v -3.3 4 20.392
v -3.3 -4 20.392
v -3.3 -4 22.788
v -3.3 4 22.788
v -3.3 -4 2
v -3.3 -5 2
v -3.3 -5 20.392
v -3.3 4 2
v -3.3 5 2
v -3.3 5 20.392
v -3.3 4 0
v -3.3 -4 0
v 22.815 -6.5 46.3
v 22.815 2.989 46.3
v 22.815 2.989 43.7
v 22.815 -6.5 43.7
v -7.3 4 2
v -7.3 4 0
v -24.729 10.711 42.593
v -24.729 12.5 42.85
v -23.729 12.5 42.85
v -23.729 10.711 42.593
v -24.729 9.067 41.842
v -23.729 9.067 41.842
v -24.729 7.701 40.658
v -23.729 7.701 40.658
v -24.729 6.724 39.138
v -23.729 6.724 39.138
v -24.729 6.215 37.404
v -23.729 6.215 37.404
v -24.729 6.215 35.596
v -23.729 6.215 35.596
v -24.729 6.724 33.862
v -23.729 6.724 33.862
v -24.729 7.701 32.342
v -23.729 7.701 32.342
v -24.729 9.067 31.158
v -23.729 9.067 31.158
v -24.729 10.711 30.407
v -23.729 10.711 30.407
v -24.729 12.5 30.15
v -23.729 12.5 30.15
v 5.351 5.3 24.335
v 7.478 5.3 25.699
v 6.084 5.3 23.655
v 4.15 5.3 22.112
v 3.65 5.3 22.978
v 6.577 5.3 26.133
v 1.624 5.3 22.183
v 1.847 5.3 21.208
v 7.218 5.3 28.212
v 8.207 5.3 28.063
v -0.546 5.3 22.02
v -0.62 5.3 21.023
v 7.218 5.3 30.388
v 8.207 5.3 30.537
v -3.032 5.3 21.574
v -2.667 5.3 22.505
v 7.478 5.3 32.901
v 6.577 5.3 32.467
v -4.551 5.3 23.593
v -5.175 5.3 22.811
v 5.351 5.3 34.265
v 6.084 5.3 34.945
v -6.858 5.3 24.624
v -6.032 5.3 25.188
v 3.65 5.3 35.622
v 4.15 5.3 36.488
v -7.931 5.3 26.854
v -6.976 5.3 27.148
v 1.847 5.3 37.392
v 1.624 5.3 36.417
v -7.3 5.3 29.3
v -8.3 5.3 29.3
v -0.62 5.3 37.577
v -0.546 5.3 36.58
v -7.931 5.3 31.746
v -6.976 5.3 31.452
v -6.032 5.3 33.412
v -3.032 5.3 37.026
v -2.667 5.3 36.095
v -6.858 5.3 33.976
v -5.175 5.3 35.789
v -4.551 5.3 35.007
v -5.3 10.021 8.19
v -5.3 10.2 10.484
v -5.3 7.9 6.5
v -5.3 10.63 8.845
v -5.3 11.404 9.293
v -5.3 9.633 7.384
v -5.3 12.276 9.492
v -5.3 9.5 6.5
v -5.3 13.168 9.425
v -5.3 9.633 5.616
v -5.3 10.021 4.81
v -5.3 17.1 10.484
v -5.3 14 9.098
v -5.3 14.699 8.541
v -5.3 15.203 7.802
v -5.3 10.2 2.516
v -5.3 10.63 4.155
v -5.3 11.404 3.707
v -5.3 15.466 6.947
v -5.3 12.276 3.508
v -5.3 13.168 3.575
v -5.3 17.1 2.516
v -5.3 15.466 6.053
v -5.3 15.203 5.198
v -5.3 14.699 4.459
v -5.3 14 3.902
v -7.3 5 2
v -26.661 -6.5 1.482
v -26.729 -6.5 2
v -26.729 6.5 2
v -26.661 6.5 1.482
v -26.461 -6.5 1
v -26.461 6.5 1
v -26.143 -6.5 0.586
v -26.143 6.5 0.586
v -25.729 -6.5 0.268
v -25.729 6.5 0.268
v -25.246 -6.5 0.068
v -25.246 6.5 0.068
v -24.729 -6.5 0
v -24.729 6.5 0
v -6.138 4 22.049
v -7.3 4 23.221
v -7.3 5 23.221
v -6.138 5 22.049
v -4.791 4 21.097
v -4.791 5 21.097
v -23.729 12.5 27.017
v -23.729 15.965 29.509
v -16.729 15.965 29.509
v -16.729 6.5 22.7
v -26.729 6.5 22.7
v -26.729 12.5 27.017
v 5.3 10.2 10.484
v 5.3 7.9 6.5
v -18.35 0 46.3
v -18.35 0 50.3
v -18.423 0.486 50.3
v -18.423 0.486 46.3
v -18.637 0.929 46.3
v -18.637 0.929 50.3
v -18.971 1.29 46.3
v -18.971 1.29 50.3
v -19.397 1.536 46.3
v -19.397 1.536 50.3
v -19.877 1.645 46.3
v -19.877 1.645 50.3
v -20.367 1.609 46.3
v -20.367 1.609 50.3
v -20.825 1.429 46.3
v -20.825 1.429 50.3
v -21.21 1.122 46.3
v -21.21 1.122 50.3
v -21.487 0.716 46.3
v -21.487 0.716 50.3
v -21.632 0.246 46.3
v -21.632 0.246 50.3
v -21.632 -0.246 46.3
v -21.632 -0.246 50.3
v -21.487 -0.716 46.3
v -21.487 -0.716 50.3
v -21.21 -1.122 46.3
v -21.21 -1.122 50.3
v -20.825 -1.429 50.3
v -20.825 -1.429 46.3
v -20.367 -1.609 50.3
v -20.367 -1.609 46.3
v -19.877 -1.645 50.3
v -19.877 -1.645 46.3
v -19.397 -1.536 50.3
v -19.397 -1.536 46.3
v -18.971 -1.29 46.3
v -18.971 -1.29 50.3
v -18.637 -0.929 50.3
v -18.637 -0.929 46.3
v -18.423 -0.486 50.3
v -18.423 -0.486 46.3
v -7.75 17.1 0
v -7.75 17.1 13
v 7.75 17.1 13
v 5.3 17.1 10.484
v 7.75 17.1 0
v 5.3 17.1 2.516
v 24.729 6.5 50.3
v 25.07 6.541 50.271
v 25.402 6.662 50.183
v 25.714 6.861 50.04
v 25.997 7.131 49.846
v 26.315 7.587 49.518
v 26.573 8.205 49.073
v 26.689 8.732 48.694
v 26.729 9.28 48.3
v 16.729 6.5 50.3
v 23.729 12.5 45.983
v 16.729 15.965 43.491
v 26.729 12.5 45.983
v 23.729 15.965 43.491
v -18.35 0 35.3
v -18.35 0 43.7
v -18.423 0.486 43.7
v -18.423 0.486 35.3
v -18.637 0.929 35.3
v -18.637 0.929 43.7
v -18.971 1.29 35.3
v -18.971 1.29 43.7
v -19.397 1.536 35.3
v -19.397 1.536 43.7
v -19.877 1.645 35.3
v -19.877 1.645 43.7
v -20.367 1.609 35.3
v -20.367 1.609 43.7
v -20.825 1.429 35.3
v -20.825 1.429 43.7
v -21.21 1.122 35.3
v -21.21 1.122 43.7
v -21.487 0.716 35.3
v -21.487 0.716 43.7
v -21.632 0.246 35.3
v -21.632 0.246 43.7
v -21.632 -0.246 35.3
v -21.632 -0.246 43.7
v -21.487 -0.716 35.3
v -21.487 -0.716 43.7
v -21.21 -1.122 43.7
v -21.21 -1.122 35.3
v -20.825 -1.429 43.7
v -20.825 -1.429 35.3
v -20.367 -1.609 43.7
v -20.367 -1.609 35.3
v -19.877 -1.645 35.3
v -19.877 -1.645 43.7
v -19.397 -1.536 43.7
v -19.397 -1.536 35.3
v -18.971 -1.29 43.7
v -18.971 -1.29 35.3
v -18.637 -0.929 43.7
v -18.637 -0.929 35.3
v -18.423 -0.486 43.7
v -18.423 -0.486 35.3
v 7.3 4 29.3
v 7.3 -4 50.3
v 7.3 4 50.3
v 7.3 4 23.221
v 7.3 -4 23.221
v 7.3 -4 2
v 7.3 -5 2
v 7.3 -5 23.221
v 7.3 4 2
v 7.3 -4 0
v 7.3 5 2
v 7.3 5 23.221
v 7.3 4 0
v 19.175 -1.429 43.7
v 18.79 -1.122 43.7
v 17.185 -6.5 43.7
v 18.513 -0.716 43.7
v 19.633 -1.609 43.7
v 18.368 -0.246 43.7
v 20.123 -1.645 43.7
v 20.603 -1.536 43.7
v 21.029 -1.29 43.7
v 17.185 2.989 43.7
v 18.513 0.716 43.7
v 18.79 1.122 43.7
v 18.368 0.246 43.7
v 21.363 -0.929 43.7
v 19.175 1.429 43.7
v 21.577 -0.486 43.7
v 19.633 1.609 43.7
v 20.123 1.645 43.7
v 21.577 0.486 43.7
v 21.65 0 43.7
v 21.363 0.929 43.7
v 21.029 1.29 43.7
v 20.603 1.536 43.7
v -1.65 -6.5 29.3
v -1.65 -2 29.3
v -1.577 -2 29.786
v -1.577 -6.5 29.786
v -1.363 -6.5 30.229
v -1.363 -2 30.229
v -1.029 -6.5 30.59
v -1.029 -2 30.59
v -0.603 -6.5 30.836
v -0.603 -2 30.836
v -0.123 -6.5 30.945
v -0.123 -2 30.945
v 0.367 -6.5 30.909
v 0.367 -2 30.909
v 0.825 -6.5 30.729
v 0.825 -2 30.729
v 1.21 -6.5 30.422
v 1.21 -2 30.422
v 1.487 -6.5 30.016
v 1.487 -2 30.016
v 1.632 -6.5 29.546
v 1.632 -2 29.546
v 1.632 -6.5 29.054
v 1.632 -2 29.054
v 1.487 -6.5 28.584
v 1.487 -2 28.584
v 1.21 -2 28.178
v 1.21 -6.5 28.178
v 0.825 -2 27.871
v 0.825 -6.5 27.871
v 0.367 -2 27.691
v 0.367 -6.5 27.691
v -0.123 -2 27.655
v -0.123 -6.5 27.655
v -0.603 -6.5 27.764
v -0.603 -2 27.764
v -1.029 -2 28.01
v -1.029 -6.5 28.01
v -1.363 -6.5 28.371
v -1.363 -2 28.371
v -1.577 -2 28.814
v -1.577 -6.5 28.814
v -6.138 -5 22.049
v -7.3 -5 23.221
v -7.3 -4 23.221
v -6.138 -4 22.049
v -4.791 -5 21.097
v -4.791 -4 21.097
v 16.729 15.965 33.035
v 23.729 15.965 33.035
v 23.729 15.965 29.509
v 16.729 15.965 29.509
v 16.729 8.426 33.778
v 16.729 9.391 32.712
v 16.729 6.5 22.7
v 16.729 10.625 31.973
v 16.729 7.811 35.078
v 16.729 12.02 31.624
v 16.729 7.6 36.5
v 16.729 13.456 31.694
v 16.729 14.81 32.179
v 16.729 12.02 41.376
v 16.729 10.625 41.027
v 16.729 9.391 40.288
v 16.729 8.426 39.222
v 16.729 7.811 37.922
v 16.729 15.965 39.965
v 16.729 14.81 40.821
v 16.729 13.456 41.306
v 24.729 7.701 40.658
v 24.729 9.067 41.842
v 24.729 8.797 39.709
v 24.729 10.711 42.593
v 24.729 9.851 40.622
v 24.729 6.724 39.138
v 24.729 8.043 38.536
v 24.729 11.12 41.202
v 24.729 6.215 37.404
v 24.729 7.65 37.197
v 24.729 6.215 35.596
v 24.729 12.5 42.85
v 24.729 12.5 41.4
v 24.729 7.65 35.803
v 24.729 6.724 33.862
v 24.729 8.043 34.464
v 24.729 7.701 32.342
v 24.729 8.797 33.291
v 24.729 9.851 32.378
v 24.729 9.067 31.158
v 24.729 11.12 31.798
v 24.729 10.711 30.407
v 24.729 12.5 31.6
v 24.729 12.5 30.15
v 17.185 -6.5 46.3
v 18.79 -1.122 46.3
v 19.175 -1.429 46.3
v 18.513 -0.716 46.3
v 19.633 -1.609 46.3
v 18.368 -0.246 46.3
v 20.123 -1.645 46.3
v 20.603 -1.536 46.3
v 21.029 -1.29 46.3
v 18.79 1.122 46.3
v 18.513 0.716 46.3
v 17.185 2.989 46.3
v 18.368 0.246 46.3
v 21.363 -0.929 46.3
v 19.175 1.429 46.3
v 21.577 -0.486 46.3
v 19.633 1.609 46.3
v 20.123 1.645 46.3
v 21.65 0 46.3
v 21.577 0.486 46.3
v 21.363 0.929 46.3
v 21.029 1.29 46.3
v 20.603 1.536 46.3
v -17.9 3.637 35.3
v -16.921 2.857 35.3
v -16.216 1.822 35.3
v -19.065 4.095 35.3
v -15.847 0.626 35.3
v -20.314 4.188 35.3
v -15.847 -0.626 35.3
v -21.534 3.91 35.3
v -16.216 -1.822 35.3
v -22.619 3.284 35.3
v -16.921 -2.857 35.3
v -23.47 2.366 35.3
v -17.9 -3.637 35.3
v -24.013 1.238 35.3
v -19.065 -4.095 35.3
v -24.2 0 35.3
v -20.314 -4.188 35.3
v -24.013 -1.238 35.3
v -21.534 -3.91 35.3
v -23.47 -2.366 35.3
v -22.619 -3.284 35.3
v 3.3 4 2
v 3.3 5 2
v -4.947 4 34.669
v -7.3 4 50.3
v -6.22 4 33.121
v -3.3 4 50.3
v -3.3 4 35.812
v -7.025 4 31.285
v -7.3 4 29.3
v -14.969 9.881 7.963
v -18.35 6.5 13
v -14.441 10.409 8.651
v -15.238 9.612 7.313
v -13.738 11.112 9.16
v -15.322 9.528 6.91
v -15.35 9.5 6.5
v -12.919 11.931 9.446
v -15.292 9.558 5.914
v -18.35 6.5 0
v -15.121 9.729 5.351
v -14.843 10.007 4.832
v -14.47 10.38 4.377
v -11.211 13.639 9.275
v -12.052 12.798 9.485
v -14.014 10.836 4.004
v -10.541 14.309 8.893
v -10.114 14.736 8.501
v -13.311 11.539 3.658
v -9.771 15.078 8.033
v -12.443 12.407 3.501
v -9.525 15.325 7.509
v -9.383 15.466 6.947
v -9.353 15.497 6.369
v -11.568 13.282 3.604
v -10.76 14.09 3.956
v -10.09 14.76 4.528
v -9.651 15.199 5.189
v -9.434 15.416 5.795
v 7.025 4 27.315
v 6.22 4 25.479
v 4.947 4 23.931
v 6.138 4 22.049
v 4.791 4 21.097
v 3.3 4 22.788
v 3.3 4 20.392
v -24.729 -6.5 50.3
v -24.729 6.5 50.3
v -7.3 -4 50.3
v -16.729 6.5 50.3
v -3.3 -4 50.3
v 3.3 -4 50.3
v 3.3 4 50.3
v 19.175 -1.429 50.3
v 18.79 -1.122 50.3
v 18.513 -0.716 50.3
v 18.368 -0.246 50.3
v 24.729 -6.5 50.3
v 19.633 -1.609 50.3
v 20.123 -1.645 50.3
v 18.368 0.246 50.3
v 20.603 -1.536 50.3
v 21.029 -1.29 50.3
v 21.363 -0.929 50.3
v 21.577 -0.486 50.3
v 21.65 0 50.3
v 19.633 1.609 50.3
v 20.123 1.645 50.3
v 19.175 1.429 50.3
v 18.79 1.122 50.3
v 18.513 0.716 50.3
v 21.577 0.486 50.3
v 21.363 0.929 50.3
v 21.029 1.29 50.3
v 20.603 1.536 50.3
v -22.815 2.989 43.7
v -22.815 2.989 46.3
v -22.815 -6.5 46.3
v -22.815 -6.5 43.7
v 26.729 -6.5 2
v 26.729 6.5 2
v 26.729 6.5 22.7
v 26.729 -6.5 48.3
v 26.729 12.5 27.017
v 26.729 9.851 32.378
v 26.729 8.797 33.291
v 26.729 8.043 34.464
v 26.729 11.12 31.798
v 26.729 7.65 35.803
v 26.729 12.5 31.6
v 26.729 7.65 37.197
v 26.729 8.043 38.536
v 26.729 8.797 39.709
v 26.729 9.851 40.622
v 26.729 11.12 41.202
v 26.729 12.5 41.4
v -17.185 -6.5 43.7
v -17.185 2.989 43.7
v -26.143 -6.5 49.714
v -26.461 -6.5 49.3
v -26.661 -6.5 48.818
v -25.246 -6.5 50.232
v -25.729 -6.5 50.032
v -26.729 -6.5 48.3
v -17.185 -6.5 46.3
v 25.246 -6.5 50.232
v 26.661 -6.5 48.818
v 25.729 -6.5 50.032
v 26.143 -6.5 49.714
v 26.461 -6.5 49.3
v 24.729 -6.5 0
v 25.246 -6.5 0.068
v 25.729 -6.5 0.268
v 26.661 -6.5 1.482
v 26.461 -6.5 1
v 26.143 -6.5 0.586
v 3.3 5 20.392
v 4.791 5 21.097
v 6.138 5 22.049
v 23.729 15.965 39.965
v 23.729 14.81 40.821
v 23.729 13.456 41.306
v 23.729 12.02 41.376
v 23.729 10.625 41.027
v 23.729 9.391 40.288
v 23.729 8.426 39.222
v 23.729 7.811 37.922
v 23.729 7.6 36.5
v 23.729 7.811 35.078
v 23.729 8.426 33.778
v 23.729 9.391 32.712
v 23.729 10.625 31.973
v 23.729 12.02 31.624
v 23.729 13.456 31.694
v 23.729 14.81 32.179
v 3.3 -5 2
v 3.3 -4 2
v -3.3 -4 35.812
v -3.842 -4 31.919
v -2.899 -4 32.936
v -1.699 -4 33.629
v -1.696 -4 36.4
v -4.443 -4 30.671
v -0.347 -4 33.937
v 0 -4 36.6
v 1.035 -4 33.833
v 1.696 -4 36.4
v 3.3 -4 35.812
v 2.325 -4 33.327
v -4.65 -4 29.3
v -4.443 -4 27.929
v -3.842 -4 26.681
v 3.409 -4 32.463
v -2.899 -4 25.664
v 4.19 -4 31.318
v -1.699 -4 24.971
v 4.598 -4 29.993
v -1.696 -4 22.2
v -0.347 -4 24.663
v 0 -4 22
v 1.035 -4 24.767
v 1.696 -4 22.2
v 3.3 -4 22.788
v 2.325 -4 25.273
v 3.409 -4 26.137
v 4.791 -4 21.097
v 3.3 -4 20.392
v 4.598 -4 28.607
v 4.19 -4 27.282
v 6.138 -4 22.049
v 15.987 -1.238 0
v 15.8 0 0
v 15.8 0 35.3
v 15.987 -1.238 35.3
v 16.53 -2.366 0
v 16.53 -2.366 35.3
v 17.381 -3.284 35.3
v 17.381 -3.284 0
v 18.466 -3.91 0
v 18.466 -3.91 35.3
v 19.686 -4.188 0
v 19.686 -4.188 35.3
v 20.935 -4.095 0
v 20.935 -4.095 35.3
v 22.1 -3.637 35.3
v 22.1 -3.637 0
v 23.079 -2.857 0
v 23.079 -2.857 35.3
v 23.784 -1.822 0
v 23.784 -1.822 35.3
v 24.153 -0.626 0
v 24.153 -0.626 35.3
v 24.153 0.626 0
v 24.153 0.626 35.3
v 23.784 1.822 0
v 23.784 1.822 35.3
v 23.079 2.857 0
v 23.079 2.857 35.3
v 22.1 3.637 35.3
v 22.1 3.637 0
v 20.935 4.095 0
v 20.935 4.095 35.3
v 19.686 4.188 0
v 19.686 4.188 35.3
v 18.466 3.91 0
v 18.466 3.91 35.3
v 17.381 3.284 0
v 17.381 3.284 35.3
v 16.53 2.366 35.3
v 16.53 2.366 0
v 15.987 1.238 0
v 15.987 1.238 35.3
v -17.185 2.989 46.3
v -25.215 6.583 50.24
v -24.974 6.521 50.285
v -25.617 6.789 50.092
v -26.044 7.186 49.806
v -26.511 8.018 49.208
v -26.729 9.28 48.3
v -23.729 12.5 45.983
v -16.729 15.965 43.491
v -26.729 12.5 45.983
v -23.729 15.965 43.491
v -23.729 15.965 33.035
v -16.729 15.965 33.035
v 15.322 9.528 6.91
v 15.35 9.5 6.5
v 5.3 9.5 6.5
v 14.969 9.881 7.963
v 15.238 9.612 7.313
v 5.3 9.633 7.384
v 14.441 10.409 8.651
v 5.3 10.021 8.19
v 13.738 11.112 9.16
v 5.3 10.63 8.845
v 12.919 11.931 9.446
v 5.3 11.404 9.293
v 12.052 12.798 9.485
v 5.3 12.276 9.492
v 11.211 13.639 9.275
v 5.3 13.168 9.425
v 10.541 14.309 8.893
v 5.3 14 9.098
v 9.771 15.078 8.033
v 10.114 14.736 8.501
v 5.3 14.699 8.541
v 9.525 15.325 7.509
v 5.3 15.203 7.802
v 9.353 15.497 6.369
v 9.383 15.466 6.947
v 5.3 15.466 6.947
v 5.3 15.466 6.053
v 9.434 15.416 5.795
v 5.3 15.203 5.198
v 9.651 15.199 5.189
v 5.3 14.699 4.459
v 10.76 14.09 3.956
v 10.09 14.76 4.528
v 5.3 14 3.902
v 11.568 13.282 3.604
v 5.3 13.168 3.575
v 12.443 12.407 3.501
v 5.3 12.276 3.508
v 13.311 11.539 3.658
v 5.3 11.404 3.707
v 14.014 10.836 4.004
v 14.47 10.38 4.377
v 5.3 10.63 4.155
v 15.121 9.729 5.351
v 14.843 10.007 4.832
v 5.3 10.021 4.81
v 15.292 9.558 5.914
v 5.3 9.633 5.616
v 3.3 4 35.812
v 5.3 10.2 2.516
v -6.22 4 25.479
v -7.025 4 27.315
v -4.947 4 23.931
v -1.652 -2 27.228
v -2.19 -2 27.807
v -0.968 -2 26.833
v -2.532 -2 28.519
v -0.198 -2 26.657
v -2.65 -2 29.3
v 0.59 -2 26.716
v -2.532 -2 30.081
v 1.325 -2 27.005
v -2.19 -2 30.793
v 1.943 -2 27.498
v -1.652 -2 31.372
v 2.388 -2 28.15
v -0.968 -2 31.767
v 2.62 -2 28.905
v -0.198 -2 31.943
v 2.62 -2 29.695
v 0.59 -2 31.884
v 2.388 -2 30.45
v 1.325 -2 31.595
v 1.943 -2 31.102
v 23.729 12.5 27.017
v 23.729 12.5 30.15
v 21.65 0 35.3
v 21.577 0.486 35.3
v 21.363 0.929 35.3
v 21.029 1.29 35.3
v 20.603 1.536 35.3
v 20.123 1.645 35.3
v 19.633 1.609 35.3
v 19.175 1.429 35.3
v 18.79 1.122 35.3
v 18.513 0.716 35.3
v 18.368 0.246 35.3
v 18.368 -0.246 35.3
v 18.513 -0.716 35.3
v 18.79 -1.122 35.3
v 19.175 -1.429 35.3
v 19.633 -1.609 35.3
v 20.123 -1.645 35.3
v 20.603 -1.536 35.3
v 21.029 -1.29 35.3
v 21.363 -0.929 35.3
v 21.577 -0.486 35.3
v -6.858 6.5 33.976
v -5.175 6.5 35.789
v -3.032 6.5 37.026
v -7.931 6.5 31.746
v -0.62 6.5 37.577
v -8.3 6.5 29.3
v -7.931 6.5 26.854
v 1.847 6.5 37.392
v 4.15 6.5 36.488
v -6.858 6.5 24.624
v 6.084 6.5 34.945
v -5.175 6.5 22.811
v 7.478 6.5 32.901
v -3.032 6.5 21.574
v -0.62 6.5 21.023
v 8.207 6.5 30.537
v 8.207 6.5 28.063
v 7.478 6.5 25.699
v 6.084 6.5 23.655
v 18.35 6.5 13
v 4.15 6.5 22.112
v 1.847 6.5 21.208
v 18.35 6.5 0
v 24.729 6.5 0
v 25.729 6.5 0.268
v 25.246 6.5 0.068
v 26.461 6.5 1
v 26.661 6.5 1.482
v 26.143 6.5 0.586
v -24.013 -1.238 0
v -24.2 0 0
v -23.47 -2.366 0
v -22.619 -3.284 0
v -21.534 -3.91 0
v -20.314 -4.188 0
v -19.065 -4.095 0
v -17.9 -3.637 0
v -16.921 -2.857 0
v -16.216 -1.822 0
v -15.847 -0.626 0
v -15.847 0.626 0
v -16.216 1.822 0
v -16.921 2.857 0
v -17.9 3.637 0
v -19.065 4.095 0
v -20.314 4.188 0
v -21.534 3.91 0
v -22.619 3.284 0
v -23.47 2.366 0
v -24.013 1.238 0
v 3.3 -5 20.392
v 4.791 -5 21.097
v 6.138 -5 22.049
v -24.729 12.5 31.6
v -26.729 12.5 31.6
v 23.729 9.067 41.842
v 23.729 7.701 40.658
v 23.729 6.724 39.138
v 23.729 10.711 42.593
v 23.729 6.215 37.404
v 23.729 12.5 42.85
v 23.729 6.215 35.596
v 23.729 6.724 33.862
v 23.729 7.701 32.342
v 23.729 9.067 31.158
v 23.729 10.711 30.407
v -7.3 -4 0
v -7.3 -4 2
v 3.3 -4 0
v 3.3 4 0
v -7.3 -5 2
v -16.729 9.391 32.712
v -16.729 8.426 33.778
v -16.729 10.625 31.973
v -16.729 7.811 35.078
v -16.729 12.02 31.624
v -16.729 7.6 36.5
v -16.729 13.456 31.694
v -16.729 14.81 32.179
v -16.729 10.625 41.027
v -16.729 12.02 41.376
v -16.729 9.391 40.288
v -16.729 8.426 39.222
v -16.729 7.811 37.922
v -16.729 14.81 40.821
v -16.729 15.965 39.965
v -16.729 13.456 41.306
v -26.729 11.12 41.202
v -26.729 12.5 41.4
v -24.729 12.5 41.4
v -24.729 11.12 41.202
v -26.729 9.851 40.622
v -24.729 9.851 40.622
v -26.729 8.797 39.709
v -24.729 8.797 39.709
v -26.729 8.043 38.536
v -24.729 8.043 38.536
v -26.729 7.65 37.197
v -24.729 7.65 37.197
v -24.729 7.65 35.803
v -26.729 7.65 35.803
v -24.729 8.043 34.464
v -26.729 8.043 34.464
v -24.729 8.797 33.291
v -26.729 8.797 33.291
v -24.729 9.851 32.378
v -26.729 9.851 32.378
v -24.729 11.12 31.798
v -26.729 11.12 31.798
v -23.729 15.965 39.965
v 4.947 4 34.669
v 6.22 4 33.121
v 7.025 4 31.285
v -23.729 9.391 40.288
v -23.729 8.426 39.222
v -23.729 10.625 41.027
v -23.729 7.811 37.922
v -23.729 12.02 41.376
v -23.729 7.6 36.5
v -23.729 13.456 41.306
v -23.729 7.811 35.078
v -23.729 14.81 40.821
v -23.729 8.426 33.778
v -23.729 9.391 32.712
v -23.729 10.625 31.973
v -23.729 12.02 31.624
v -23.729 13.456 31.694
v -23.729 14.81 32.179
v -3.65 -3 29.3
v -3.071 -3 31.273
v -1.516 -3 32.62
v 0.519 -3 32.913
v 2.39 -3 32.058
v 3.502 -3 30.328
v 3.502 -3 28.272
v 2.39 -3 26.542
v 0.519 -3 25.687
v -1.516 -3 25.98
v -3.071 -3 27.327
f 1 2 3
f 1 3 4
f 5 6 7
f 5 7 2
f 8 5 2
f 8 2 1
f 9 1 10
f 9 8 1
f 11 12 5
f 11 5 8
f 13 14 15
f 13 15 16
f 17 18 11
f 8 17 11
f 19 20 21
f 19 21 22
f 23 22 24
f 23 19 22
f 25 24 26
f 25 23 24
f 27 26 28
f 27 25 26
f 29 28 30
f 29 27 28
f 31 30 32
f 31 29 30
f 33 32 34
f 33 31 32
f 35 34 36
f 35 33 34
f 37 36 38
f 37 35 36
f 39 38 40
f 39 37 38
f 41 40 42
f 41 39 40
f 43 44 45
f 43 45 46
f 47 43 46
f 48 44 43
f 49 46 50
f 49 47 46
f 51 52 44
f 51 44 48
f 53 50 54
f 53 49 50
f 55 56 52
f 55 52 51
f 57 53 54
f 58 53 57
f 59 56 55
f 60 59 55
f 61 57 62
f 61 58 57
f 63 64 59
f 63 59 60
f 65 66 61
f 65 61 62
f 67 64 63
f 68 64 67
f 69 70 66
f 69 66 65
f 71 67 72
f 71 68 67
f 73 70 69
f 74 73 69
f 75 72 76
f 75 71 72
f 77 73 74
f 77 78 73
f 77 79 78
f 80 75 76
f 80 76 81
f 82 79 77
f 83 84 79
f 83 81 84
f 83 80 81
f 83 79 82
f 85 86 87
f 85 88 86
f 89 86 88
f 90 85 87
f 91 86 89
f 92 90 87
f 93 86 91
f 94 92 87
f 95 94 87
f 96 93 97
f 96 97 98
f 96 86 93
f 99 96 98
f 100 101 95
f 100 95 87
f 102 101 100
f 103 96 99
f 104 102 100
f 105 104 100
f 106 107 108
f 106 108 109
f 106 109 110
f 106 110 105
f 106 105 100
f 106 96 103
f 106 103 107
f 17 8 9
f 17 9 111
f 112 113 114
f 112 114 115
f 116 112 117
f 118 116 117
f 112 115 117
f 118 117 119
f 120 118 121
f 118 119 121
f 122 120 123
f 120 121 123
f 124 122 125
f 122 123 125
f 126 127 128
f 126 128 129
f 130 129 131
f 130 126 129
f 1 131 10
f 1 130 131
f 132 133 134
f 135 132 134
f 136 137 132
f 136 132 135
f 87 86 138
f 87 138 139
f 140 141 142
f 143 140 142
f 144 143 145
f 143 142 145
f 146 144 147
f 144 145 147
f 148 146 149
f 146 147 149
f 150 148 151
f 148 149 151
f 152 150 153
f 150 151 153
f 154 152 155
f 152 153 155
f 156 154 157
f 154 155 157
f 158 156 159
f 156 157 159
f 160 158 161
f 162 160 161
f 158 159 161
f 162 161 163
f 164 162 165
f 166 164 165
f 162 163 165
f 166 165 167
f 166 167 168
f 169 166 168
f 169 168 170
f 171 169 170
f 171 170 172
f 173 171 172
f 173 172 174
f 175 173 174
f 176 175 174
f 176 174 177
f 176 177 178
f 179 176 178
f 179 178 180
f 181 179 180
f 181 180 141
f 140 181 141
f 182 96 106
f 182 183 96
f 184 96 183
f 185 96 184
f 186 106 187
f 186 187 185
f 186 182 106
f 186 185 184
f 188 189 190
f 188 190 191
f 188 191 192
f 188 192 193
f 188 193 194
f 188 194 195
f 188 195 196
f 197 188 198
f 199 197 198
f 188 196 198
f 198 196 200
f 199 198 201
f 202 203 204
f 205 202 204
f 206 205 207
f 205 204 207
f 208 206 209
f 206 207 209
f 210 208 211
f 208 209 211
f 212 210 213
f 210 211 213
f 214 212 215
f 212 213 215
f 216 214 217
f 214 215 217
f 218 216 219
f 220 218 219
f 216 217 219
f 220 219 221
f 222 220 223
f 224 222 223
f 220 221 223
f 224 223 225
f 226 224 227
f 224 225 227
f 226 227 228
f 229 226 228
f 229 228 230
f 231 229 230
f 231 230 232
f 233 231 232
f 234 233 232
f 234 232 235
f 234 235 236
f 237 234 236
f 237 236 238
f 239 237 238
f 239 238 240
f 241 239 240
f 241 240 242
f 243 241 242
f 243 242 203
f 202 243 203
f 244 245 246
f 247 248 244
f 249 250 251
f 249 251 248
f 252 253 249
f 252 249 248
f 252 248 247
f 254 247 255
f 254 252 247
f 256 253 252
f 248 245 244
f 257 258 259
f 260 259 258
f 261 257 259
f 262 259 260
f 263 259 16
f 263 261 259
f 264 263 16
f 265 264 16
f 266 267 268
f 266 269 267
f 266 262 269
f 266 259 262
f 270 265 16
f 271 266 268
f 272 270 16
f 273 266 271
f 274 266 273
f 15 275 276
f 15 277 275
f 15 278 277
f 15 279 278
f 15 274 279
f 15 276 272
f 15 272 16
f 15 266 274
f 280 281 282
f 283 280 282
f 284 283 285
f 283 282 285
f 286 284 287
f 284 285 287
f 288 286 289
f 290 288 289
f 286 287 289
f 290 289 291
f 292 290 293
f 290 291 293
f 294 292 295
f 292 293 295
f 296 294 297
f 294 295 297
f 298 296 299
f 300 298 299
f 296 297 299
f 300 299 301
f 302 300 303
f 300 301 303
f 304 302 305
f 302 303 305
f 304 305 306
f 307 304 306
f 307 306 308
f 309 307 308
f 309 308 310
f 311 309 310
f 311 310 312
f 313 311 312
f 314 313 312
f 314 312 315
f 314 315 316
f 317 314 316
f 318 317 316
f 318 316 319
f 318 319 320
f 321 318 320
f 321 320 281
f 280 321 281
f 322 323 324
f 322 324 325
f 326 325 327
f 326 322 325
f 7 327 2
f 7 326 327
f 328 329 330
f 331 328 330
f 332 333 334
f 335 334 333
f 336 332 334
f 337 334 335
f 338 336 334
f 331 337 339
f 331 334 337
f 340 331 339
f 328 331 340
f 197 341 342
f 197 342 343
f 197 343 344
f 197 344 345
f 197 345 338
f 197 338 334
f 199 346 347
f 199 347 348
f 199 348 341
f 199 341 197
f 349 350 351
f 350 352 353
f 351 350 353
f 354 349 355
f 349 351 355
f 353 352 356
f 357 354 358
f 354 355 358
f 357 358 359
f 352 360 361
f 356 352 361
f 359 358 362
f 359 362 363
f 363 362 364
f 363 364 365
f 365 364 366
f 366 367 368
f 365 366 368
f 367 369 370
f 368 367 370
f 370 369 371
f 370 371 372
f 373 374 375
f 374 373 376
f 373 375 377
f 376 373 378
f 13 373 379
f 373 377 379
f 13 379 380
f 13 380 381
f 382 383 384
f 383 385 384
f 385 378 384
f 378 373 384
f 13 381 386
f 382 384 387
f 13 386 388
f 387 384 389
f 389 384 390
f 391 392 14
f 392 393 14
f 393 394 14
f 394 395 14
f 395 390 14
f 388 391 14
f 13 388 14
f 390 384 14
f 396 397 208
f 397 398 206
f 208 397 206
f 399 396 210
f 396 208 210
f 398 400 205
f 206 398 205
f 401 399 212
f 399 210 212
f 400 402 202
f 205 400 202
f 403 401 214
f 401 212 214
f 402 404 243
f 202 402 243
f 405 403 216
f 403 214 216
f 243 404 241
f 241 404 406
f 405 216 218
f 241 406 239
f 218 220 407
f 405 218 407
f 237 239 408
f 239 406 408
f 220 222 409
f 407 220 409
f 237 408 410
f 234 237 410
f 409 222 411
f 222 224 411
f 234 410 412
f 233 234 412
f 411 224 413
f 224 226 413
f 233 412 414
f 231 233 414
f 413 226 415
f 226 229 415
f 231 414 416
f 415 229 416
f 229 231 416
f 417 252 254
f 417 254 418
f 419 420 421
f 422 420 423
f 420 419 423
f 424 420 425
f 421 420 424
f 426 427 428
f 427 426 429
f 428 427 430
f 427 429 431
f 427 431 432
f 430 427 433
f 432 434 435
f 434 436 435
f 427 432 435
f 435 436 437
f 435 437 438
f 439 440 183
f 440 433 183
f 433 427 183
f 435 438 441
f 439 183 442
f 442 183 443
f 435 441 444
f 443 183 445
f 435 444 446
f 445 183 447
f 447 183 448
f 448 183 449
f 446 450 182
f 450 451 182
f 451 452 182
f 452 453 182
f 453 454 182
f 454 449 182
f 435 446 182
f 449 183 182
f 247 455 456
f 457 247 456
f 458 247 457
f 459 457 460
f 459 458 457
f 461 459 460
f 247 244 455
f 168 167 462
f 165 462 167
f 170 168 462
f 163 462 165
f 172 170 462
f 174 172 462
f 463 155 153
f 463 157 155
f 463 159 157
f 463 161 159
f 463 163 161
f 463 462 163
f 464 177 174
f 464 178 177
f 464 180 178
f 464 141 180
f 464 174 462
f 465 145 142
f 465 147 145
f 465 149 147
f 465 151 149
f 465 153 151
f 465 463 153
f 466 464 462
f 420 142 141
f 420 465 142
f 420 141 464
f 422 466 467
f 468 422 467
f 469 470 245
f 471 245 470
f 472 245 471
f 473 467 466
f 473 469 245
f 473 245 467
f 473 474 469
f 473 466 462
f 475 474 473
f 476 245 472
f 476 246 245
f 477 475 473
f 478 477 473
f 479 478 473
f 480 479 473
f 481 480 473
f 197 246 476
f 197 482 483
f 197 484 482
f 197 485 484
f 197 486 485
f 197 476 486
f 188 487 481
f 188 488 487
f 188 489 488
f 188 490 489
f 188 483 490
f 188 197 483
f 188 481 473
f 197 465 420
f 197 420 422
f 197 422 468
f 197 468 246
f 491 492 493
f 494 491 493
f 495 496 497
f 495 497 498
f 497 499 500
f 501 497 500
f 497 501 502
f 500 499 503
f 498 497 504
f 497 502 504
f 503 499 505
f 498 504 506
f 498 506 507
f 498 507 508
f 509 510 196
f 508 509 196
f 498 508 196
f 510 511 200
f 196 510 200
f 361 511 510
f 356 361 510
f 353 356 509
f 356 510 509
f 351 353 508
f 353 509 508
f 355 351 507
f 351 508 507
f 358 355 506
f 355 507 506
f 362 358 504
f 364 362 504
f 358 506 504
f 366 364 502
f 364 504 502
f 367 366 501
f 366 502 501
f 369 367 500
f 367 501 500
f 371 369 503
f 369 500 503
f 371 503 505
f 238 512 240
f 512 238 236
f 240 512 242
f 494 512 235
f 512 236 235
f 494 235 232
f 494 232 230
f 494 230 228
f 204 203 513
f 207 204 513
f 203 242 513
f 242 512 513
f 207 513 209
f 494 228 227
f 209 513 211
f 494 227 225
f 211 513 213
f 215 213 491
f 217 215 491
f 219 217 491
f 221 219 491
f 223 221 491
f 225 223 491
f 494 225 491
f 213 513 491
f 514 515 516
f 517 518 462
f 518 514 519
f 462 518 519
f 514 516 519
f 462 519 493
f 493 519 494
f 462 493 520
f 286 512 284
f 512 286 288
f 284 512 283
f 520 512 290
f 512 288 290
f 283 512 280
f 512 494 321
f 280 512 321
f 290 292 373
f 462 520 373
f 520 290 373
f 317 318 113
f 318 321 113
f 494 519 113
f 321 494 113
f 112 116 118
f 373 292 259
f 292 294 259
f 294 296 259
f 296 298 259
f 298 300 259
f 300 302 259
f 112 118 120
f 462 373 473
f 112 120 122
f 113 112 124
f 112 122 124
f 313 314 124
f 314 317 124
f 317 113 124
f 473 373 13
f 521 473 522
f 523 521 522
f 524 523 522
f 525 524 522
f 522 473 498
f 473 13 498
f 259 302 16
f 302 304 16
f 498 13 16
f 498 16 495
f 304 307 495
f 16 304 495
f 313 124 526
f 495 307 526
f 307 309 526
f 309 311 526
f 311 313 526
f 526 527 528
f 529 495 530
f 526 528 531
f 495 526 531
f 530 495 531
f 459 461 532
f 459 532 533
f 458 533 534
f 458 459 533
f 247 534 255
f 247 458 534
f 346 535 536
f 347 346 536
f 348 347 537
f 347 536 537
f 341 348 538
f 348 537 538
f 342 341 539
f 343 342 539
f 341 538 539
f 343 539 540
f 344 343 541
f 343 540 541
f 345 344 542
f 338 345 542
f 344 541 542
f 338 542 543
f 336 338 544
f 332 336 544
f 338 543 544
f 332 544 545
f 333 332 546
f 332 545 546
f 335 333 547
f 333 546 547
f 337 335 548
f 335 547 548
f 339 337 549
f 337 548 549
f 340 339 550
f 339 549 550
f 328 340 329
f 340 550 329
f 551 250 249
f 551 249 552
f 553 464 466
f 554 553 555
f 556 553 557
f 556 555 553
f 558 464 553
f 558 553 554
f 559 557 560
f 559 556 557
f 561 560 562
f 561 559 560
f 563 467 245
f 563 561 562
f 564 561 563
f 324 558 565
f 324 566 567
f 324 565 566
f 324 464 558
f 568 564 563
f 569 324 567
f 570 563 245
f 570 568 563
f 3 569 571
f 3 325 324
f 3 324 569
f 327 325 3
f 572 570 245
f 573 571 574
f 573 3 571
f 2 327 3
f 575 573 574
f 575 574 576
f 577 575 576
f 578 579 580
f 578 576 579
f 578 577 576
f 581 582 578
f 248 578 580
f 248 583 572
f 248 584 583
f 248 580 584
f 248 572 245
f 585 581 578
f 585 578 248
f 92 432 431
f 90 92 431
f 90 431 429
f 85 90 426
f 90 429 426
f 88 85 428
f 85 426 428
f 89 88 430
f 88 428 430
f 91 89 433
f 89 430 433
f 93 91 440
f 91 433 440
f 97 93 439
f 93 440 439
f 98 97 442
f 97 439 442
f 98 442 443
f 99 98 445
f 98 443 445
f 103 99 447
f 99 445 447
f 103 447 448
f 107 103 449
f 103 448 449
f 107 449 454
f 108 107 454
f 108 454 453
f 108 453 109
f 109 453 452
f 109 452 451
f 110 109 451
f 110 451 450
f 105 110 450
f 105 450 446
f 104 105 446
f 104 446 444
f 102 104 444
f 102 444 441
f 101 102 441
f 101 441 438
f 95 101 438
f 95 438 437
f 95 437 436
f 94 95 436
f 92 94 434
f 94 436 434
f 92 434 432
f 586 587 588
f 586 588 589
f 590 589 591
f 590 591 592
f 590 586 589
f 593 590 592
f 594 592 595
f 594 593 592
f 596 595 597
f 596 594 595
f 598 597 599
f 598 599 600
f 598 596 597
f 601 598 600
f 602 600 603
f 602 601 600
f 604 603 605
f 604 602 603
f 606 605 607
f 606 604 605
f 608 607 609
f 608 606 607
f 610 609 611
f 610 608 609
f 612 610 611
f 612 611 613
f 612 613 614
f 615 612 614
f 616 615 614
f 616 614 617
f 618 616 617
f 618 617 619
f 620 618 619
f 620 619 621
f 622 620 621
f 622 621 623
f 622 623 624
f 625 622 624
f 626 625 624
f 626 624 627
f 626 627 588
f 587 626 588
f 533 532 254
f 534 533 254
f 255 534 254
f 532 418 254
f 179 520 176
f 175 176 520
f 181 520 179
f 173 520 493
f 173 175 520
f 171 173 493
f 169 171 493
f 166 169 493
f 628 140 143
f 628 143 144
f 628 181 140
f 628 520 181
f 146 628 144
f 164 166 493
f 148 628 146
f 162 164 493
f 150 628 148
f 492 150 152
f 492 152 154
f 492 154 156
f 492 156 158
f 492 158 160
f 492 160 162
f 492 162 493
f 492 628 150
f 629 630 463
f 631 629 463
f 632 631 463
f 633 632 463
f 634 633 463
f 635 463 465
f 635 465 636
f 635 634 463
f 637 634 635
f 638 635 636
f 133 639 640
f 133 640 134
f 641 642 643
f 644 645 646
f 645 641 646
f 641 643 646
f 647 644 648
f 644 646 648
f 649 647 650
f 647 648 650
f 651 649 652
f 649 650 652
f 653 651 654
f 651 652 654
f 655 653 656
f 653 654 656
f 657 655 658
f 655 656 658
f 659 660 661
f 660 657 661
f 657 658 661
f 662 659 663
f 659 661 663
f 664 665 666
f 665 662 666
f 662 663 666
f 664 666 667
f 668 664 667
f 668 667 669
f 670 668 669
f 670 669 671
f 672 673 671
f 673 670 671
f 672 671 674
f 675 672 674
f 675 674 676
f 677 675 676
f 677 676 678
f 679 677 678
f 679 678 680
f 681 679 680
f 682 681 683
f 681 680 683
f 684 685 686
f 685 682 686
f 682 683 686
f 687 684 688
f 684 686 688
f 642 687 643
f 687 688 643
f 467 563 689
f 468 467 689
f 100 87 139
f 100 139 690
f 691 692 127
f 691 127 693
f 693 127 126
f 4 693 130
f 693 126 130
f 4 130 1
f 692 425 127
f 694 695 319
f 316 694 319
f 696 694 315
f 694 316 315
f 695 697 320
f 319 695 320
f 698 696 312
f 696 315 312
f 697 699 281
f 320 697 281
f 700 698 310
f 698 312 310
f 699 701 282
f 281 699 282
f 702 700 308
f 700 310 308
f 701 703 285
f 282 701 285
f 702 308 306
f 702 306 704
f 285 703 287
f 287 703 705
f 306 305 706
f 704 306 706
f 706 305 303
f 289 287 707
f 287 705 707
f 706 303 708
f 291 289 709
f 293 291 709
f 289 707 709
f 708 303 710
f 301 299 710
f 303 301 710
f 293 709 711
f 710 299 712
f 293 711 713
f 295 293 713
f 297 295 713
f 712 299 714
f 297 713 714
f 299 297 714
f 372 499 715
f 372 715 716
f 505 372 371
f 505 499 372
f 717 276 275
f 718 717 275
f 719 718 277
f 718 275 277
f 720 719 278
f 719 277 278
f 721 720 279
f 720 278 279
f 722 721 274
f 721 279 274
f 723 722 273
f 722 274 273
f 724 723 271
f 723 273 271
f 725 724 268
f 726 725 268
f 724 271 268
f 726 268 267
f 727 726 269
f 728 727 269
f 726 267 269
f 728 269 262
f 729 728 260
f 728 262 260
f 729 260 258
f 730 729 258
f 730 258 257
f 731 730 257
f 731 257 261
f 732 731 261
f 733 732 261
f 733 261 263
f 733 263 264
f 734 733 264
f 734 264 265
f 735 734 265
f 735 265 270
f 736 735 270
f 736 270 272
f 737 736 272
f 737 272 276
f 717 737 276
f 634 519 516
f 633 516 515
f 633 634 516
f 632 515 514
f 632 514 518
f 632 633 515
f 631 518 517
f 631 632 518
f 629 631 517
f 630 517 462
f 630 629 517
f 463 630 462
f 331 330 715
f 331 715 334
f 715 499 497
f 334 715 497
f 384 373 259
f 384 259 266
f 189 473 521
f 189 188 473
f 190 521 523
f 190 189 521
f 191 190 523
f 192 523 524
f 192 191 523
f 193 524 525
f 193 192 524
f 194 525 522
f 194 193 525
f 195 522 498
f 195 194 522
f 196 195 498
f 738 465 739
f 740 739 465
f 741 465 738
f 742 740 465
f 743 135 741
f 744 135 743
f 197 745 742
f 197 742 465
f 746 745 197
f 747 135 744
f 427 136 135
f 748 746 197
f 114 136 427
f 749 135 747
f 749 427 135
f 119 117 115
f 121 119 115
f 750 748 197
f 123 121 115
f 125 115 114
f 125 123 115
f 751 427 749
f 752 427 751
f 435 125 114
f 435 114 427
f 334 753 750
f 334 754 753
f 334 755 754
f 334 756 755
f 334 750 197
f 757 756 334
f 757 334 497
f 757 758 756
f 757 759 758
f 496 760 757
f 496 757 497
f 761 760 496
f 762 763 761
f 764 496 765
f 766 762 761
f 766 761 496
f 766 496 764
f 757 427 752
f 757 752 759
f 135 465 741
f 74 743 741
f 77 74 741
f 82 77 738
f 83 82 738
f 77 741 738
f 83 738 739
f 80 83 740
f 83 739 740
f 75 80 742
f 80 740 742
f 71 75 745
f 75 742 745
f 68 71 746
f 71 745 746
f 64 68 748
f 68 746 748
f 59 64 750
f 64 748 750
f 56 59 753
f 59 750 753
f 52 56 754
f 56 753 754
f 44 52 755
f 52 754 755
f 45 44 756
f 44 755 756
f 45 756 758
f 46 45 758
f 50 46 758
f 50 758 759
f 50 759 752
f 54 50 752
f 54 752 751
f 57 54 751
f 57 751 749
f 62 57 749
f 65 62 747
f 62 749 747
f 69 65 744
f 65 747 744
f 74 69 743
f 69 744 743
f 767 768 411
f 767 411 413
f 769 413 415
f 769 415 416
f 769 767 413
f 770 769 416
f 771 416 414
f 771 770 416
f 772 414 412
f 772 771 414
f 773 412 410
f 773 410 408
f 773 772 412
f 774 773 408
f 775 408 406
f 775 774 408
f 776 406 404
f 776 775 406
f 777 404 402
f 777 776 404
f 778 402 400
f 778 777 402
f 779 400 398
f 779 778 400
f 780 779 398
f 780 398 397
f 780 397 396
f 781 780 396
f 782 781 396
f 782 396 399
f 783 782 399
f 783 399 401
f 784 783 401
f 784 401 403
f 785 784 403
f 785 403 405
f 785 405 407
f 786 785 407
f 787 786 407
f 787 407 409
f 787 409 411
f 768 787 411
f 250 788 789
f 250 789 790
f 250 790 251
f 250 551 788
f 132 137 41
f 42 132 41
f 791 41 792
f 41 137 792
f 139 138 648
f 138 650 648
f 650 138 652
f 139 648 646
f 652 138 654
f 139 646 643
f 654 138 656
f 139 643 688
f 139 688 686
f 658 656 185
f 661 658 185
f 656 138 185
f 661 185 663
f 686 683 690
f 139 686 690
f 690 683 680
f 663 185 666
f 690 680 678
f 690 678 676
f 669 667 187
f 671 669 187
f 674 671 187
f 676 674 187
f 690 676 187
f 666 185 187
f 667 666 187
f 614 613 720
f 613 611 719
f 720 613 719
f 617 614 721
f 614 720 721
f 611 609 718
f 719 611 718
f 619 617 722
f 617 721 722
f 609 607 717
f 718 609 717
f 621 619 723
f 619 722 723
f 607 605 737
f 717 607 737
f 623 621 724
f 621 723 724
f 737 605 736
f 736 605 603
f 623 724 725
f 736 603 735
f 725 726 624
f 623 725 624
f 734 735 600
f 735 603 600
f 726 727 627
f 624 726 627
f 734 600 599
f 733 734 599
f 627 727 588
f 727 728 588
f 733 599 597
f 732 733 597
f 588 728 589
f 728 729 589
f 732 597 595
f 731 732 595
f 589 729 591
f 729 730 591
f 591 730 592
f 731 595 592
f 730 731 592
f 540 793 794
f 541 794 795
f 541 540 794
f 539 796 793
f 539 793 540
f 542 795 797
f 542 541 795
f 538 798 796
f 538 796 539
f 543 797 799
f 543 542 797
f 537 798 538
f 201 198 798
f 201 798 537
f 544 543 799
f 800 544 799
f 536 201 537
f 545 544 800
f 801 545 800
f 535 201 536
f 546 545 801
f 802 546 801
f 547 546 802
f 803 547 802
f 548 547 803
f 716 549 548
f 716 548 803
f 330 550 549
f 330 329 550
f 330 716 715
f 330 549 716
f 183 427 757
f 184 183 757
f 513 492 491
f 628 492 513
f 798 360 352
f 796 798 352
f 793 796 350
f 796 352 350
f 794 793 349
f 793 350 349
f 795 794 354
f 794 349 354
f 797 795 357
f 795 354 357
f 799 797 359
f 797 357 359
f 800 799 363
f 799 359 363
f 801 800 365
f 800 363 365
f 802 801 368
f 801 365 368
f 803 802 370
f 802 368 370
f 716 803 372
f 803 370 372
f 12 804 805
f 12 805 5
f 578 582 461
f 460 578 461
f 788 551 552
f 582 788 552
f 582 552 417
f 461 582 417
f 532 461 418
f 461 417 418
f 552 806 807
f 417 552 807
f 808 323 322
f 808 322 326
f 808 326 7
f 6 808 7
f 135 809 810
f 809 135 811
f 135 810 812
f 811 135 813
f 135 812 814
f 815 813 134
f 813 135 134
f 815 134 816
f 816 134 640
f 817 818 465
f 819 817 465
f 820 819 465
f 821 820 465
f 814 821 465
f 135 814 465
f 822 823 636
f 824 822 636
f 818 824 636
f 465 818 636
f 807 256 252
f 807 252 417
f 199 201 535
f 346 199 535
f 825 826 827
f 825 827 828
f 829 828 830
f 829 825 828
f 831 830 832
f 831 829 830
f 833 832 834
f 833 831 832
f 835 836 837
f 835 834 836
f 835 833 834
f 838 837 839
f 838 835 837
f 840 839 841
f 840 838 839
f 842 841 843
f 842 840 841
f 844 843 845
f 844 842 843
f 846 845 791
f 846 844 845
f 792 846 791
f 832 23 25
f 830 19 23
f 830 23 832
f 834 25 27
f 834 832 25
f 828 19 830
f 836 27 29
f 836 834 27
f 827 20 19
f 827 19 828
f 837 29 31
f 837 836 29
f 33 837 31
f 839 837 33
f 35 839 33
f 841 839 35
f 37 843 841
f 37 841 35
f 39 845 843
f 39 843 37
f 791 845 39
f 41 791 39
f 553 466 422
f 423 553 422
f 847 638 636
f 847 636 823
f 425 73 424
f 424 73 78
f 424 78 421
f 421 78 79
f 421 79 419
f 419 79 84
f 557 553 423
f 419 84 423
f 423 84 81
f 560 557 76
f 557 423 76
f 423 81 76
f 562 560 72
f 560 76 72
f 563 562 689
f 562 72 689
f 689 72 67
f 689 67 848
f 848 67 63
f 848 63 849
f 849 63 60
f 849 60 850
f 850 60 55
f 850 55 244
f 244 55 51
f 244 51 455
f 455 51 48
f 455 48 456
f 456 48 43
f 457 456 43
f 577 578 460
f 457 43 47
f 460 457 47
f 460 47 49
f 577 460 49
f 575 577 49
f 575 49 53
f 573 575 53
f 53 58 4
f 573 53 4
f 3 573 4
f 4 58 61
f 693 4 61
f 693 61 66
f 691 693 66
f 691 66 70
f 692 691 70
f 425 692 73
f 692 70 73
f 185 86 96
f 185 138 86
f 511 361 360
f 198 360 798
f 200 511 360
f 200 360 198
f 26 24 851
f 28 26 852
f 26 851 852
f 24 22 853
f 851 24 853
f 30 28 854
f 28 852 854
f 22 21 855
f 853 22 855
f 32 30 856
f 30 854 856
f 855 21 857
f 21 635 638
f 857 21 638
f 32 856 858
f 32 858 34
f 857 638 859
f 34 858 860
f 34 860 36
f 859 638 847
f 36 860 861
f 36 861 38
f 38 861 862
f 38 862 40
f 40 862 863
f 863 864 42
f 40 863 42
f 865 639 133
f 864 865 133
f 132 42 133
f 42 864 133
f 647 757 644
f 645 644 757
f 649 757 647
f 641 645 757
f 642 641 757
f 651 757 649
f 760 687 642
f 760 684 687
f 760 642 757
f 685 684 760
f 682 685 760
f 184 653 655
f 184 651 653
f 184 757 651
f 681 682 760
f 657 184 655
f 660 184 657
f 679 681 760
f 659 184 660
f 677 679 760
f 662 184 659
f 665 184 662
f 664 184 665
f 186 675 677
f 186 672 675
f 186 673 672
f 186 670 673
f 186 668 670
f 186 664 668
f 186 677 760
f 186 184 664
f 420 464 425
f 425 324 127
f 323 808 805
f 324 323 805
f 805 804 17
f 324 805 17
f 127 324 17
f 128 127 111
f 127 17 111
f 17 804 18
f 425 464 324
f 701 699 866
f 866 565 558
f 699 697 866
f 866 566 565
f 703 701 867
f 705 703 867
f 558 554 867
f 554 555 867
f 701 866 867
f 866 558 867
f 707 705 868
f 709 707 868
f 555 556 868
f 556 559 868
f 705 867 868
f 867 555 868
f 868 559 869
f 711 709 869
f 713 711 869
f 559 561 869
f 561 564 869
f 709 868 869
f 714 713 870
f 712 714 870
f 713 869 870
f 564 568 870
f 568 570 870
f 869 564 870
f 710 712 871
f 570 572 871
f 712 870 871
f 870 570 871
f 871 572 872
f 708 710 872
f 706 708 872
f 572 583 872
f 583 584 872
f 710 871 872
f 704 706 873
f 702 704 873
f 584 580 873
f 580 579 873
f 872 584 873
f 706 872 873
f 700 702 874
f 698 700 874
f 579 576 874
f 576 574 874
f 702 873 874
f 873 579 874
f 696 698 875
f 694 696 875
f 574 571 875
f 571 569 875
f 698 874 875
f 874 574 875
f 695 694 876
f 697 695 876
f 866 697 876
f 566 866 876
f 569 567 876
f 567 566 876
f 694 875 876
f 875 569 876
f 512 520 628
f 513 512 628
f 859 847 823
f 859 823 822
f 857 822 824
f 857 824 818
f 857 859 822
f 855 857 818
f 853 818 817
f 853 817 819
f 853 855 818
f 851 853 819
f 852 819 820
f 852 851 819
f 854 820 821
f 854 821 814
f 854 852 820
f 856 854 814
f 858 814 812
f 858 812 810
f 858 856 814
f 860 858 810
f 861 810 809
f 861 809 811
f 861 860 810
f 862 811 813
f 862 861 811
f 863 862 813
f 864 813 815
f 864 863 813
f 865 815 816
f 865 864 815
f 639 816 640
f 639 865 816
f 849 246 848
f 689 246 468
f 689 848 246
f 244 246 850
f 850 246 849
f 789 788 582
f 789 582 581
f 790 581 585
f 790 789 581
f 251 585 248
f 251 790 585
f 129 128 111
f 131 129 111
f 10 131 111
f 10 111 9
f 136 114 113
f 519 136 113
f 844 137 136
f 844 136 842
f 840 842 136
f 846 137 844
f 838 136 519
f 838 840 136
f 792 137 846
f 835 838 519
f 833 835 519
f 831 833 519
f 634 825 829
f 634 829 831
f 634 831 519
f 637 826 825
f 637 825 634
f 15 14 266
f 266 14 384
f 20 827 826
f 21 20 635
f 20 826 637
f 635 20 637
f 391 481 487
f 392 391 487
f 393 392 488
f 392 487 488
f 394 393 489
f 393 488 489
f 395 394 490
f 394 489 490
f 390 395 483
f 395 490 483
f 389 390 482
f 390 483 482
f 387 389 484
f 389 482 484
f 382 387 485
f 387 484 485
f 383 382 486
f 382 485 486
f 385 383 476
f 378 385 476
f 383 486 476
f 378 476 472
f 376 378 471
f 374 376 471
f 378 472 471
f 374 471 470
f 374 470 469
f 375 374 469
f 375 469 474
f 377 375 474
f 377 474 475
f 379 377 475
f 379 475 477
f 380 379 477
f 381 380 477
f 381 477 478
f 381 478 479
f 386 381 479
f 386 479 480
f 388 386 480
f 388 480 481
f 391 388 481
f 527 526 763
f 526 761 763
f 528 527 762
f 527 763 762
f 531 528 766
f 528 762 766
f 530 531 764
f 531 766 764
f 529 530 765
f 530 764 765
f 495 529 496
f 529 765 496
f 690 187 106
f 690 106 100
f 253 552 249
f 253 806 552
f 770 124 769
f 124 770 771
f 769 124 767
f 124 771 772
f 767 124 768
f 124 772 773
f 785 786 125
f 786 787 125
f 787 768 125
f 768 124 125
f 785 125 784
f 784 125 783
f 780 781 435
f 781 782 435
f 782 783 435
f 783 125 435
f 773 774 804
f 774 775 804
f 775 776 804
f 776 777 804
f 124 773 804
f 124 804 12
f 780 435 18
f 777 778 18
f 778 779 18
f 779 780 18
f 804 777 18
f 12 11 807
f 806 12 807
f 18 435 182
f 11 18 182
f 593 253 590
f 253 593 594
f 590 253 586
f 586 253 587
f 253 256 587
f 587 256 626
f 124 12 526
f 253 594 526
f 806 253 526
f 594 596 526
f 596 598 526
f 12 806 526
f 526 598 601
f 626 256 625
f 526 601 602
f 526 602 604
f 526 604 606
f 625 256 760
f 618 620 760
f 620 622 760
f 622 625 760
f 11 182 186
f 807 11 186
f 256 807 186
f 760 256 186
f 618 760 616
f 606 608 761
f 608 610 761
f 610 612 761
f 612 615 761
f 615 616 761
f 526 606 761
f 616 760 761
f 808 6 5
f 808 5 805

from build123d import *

# Parameters (mm, degrees)
SKETCH1_W           = 53.4573
SKETCH1_H           = 13
SKETCH1_R           = 4.2
BOSS_EXTRUDE1_DEPTH = 50.3
BOSS_EXTRUDE2_START = -15
SKETCH3_R           = 4.2
BOSS_EXTRUDE2_DEPTH = 15
SKETCH8_W           = 15.5
SKETCH8_H           = 13
BOSS_EXTRUDE3_DEPTH = 10.6
CHAMFER1_SIZE       = 10.6
SKETCH5_R           = 3
SKETCH5_R_2         = 4
CUT_EXTRUDE1_DEPTH  = 76.366988286
CUT_EXTRUDE2_DEPTH  = 5.3
BOSS_EXTRUDE4_DEPTH = 10
CUT_EXTRUDE3_DEPTH  = 1
SKETCH13_W          = 21.695080859
SKETCH13_H          = 9.09610943
CUT_EXTRUDE4_DEPTH  = 3
SKETCH16_R          = 1.65
CUT_EXTRUDE5_DEPTH  = 59.425257644
SKETCH17_R          = 7.3
CUT_EXTRUDE6_DEPTH  = 10.5
SKETCH15_W          = 4
SKETCH15_H          = 8
CUT_EXTRUDE7_DEPTH  = 60.472016368
SKETCH18_R          = 8.3
CUT_EXTRUDE8_DEPTH  = 1.2
SKETCH21_R          = 1.65
CUT_EXTRUDE9_DEPTH  = 60.472016368
CUT_EXTRUDE10_DEPTH = 2.6
FILLET1_R           = 2
CUT_EXTRUDE11_START = -1
CUT_EXTRUDE11_DEPTH = 10


# Read off the part's stored shape, not the designer's step: Cut-Extrude11
with BuildPart() as part:
    # Sketch1 → Boss-Extrude1 (new body)
    with BuildSketch(Plane.XY):
        Rectangle(SKETCH1_W, SKETCH1_H)
        with Locations(Location((-20, 0, 0), (0, 0, 180))):
            Circle(SKETCH1_R, mode=Mode.SUBTRACT)
        with Locations(Location((20, 0, 0), (0, 0, 180))):
            Circle(SKETCH1_R, mode=Mode.SUBTRACT)
    extrude(amount=BOSS_EXTRUDE1_DEPTH)

    # Sketch3 → Boss-Extrude2 (add)
    with BuildSketch(Plane.XY.offset(50.3).offset(BOSS_EXTRUDE2_START)):
        with Locations(Location((-20, 0, 0), (0, 0, 180))):
            Circle(SKETCH3_R)
        with Locations(Location((20, 0, 0), (0, 0, 180))):
            Circle(SKETCH3_R)
    extrude(amount=BOSS_EXTRUDE2_DEPTH)

    # Sketch8 → Boss-Extrude3 (add)
    with BuildSketch(Plane(origin=(0, 6.5, 0), x_dir=(1, 0, 0), z_dir=(0, 1, 0))):
        with Locations((0, -6.5)):
            Rectangle(SKETCH8_W, SKETCH8_H)
    extrude(amount=BOSS_EXTRUDE3_DEPTH)

    # Chamfer1
    chamfer1_edges = [part.edges().sort_by_distance(p)[0] for p in [
        (7.75, 6.5, 6.5),
        (-7.75, 6.5, 6.5),
    ]]
    chamfer(chamfer1_edges, length=CHAMFER1_SIZE - 0.0001)  # a hair under: the kernel refuses the full size

    # Sketch5 → Cut-Extrude1 (cut, through all)
    with BuildSketch(Plane.ZY.offset(26.72865)):
        with Locations(Location((6.5, 12.5, 0), (0, 0, 270))):
            Circle(SKETCH5_R)
        with Locations((36.5, 12.5)):
            Circle(SKETCH5_R_2)
    extrude(amount=-CUT_EXTRUDE1_DEPTH, mode=Mode.SUBTRACT)

    # Sketch10 → Cut-Extrude2 (cut)
    with BuildSketch(Plane.ZY):
        Polygon((2.516283143, 14.8), (2.516283143, 17.1), (10.483716857, 17.1), (10.483716857, 14.8), (10.483716857, 10.2), (6.5, 7.9), (2.516283143, 10.2), align=None)
    cut_extrude2 = extrude(amount=-CUT_EXTRUDE2_DEPTH, mode=Mode.SUBTRACT)

    # Mirror1: Cut-Extrude2 across plane
    add(cut_extrude2.mirror(Plane.ZY), mode=Mode.SUBTRACT)

    # Sketch11 → Boss-Extrude4 (add)
    with BuildSketch(Plane.ZY.offset(26.72865)):
        with BuildLine():
            Line((33.035176772, 15.964823228), (29.509293572, 15.964823228))
            Line((29.509293572, 15.964823228), (22.7, 6.5))
            Line((22.7, 6.5), (50.3, 6.5))
            Line((50.3, 6.5), (43.490706428, 15.964823228))
            Line((43.490706428, 15.964823228), (39.964823228, 15.964823228))
            ThreePointArc((39.964823228, 15.964823228), (36.5, 7.6), (33.035176772, 15.964823228))
        make_face()
    boss_extrude4 = extrude(amount=-BOSS_EXTRUDE4_DEPTH)

    # Sketch12 → Cut-Extrude3 (cut)
    with BuildSketch(Plane.ZY.offset(24.72865)):
        with BuildLine():
            Line((30.15, 12.5), (30.15, 21.960655534))
            Line((30.15, 21.960655534), (42.85, 21.960655534))
            Line((42.85, 21.960655534), (42.85, 12.5))
            ThreePointArc((42.85, 12.5), (36.5, 6.15), (30.15, 12.5))
        make_face()
    cut_extrude3 = extrude(amount=-CUT_EXTRUDE3_DEPTH, mode=Mode.SUBTRACT)

    # Sketch13 → Cut-Extrude4 (cut)
    with BuildSketch(Plane.ZY.offset(26.72865)):
        with Locations((35.453328021, 17.048054715)):
            Rectangle(SKETCH13_W, SKETCH13_H)
    cut_extrude4 = extrude(amount=-CUT_EXTRUDE4_DEPTH, mode=Mode.SUBTRACT)

    # Mirror2: Boss-Extrude4, Cut-Extrude3, Cut-Extrude4 across plane
    add(boss_extrude4.mirror(Plane.ZY))
    add(cut_extrude3.mirror(Plane.ZY), mode=Mode.SUBTRACT)
    add(cut_extrude4.mirror(Plane.ZY), mode=Mode.SUBTRACT)

    # Sketch16 → Cut-Extrude5 (cut, through all)
    with BuildSketch(Plane(origin=(0, 6.5, 0), x_dir=(1, 0, 0), z_dir=(0, 1, 0))):
        with Locations(Location((0, -29.3, 0), (0, 0, 180))):
            Circle(SKETCH16_R)
    extrude(amount=-CUT_EXTRUDE5_DEPTH, mode=Mode.SUBTRACT)

    # Sketch17 → Cut-Extrude6 (cut)
    with BuildSketch(Plane(origin=(0, 6.5, 0), x_dir=(1, 0, 0), z_dir=(0, 1, 0))):
        with Locations(Location((0, -29.3, 0), (0, 0, 180))):
            Circle(SKETCH17_R)
    extrude(amount=-CUT_EXTRUDE6_DEPTH, mode=Mode.SUBTRACT)

    # Sketch15 → Cut-Extrude7 (cut, through all)
    with BuildSketch(Plane(origin=(0, 0, 0), x_dir=(-1, 0, 0), z_dir=(0, 0, -1))):
        with Locations((-5.3, 0)):
            Rectangle(SKETCH15_W, SKETCH15_H)
    cut_extrude7 = extrude(amount=-CUT_EXTRUDE7_DEPTH, mode=Mode.SUBTRACT)

    # Mirror3: Cut-Extrude7 across plane
    add(cut_extrude7.mirror(Plane.ZY), mode=Mode.SUBTRACT)

    # Sketch18 → Cut-Extrude8 (cut)
    with BuildSketch(Plane(origin=(0, 6.5, 0), x_dir=(1, 0, 0), z_dir=(0, 1, 0))):
        with Locations(Location((0, -29.3, 0), (0, 0, 180))):
            Circle(SKETCH18_R)
    extrude(amount=-CUT_EXTRUDE8_DEPTH, mode=Mode.SUBTRACT)

    # Sketch20 → Revolve1 (revolve)
    with BuildSketch(Plane.ZY, mode=Mode.PRIVATE) as revolve1_sk:
        Polygon((30.95, -4), (30.95, -2), (31.95, -2), (33.95, -4), align=None)
    revolve(revolve1_sk.sketch.rotate(Axis((0, -4, 29.3), (0, 1, 0)), 270), axis=Axis((0, -4, 29.3), (0, 1, 0)))

    # Sketch21 → Cut-Extrude9 (cut, through all)
    with BuildSketch(Plane.XY.offset(50.3)):
        with Locations((20, 0)):
            Circle(SKETCH21_R)
        with Locations((-20, 0)):
            Circle(SKETCH21_R)
    extrude(amount=-CUT_EXTRUDE9_DEPTH, mode=Mode.SUBTRACT)

    # Sketch22 → Cut-Extrude10 (cut)
    with BuildSketch(Plane.XY.offset(46.3)):
        Polygon((-22.814582562, 1.414434516), (-22.814582562, 2.989434516), (-17.185417438, 2.989434516), (-17.185417438, 1.497865113), (-17.185417438, -1.625), (-17.185417438, -7.227237341), (-22.814582562, -7.227237341), (-22.814582562, -1.625), align=None)
    cut_extrude10 = extrude(amount=-CUT_EXTRUDE10_DEPTH, mode=Mode.SUBTRACT)

    # Mirror4: Cut-Extrude10 across plane
    add(cut_extrude10.mirror(Plane.ZY), mode=Mode.SUBTRACT)

    # Fillet1
    fillet1_edges = [part.edges().sort_by_distance(p)[0] for p in [
        (26.72865, 0, 0),
        (26.72865, 0, 50.3),
        (-26.72865, 0, 0),
        (-26.72865, 0, 50.3),
    ]]
    fillet(fillet1_edges, radius=FILLET1_R)

    # Cut-Extrude11 outline → Cut-Extrude11 (cut)
    with BuildSketch(Plane(origin=(0, -4, 0), x_dir=(1, 0, 0), z_dir=(0, 1, 0)).offset(CUT_EXTRUDE11_START)):
        with BuildLine():
            ThreePointArc((3.3, -20.391577019), (5.485502581, -21.543759839), (7.3, -23.220526339))
            Line((7.3, -23.220526339), (7.3, -2))
            Line((7.3, -2), (3.3, -2))
            Line((3.3, -2), (3.3, -20.391577019))
        make_face()
        with BuildLine():
            Line((-7.3, -2), (-7.3, -23.220526339))
            ThreePointArc((-7.3, -23.220526339), (-5.485502581, -21.543759839), (-3.3, -20.391577019))
            Line((-3.3, -20.391577019), (-3.3, -2))
            Line((-3.3, -2), (-7.3, -2))
        make_face()
    extrude(amount=CUT_EXTRUDE11_DEPTH, mode=Mode.SUBTRACT)


solid = part.part
